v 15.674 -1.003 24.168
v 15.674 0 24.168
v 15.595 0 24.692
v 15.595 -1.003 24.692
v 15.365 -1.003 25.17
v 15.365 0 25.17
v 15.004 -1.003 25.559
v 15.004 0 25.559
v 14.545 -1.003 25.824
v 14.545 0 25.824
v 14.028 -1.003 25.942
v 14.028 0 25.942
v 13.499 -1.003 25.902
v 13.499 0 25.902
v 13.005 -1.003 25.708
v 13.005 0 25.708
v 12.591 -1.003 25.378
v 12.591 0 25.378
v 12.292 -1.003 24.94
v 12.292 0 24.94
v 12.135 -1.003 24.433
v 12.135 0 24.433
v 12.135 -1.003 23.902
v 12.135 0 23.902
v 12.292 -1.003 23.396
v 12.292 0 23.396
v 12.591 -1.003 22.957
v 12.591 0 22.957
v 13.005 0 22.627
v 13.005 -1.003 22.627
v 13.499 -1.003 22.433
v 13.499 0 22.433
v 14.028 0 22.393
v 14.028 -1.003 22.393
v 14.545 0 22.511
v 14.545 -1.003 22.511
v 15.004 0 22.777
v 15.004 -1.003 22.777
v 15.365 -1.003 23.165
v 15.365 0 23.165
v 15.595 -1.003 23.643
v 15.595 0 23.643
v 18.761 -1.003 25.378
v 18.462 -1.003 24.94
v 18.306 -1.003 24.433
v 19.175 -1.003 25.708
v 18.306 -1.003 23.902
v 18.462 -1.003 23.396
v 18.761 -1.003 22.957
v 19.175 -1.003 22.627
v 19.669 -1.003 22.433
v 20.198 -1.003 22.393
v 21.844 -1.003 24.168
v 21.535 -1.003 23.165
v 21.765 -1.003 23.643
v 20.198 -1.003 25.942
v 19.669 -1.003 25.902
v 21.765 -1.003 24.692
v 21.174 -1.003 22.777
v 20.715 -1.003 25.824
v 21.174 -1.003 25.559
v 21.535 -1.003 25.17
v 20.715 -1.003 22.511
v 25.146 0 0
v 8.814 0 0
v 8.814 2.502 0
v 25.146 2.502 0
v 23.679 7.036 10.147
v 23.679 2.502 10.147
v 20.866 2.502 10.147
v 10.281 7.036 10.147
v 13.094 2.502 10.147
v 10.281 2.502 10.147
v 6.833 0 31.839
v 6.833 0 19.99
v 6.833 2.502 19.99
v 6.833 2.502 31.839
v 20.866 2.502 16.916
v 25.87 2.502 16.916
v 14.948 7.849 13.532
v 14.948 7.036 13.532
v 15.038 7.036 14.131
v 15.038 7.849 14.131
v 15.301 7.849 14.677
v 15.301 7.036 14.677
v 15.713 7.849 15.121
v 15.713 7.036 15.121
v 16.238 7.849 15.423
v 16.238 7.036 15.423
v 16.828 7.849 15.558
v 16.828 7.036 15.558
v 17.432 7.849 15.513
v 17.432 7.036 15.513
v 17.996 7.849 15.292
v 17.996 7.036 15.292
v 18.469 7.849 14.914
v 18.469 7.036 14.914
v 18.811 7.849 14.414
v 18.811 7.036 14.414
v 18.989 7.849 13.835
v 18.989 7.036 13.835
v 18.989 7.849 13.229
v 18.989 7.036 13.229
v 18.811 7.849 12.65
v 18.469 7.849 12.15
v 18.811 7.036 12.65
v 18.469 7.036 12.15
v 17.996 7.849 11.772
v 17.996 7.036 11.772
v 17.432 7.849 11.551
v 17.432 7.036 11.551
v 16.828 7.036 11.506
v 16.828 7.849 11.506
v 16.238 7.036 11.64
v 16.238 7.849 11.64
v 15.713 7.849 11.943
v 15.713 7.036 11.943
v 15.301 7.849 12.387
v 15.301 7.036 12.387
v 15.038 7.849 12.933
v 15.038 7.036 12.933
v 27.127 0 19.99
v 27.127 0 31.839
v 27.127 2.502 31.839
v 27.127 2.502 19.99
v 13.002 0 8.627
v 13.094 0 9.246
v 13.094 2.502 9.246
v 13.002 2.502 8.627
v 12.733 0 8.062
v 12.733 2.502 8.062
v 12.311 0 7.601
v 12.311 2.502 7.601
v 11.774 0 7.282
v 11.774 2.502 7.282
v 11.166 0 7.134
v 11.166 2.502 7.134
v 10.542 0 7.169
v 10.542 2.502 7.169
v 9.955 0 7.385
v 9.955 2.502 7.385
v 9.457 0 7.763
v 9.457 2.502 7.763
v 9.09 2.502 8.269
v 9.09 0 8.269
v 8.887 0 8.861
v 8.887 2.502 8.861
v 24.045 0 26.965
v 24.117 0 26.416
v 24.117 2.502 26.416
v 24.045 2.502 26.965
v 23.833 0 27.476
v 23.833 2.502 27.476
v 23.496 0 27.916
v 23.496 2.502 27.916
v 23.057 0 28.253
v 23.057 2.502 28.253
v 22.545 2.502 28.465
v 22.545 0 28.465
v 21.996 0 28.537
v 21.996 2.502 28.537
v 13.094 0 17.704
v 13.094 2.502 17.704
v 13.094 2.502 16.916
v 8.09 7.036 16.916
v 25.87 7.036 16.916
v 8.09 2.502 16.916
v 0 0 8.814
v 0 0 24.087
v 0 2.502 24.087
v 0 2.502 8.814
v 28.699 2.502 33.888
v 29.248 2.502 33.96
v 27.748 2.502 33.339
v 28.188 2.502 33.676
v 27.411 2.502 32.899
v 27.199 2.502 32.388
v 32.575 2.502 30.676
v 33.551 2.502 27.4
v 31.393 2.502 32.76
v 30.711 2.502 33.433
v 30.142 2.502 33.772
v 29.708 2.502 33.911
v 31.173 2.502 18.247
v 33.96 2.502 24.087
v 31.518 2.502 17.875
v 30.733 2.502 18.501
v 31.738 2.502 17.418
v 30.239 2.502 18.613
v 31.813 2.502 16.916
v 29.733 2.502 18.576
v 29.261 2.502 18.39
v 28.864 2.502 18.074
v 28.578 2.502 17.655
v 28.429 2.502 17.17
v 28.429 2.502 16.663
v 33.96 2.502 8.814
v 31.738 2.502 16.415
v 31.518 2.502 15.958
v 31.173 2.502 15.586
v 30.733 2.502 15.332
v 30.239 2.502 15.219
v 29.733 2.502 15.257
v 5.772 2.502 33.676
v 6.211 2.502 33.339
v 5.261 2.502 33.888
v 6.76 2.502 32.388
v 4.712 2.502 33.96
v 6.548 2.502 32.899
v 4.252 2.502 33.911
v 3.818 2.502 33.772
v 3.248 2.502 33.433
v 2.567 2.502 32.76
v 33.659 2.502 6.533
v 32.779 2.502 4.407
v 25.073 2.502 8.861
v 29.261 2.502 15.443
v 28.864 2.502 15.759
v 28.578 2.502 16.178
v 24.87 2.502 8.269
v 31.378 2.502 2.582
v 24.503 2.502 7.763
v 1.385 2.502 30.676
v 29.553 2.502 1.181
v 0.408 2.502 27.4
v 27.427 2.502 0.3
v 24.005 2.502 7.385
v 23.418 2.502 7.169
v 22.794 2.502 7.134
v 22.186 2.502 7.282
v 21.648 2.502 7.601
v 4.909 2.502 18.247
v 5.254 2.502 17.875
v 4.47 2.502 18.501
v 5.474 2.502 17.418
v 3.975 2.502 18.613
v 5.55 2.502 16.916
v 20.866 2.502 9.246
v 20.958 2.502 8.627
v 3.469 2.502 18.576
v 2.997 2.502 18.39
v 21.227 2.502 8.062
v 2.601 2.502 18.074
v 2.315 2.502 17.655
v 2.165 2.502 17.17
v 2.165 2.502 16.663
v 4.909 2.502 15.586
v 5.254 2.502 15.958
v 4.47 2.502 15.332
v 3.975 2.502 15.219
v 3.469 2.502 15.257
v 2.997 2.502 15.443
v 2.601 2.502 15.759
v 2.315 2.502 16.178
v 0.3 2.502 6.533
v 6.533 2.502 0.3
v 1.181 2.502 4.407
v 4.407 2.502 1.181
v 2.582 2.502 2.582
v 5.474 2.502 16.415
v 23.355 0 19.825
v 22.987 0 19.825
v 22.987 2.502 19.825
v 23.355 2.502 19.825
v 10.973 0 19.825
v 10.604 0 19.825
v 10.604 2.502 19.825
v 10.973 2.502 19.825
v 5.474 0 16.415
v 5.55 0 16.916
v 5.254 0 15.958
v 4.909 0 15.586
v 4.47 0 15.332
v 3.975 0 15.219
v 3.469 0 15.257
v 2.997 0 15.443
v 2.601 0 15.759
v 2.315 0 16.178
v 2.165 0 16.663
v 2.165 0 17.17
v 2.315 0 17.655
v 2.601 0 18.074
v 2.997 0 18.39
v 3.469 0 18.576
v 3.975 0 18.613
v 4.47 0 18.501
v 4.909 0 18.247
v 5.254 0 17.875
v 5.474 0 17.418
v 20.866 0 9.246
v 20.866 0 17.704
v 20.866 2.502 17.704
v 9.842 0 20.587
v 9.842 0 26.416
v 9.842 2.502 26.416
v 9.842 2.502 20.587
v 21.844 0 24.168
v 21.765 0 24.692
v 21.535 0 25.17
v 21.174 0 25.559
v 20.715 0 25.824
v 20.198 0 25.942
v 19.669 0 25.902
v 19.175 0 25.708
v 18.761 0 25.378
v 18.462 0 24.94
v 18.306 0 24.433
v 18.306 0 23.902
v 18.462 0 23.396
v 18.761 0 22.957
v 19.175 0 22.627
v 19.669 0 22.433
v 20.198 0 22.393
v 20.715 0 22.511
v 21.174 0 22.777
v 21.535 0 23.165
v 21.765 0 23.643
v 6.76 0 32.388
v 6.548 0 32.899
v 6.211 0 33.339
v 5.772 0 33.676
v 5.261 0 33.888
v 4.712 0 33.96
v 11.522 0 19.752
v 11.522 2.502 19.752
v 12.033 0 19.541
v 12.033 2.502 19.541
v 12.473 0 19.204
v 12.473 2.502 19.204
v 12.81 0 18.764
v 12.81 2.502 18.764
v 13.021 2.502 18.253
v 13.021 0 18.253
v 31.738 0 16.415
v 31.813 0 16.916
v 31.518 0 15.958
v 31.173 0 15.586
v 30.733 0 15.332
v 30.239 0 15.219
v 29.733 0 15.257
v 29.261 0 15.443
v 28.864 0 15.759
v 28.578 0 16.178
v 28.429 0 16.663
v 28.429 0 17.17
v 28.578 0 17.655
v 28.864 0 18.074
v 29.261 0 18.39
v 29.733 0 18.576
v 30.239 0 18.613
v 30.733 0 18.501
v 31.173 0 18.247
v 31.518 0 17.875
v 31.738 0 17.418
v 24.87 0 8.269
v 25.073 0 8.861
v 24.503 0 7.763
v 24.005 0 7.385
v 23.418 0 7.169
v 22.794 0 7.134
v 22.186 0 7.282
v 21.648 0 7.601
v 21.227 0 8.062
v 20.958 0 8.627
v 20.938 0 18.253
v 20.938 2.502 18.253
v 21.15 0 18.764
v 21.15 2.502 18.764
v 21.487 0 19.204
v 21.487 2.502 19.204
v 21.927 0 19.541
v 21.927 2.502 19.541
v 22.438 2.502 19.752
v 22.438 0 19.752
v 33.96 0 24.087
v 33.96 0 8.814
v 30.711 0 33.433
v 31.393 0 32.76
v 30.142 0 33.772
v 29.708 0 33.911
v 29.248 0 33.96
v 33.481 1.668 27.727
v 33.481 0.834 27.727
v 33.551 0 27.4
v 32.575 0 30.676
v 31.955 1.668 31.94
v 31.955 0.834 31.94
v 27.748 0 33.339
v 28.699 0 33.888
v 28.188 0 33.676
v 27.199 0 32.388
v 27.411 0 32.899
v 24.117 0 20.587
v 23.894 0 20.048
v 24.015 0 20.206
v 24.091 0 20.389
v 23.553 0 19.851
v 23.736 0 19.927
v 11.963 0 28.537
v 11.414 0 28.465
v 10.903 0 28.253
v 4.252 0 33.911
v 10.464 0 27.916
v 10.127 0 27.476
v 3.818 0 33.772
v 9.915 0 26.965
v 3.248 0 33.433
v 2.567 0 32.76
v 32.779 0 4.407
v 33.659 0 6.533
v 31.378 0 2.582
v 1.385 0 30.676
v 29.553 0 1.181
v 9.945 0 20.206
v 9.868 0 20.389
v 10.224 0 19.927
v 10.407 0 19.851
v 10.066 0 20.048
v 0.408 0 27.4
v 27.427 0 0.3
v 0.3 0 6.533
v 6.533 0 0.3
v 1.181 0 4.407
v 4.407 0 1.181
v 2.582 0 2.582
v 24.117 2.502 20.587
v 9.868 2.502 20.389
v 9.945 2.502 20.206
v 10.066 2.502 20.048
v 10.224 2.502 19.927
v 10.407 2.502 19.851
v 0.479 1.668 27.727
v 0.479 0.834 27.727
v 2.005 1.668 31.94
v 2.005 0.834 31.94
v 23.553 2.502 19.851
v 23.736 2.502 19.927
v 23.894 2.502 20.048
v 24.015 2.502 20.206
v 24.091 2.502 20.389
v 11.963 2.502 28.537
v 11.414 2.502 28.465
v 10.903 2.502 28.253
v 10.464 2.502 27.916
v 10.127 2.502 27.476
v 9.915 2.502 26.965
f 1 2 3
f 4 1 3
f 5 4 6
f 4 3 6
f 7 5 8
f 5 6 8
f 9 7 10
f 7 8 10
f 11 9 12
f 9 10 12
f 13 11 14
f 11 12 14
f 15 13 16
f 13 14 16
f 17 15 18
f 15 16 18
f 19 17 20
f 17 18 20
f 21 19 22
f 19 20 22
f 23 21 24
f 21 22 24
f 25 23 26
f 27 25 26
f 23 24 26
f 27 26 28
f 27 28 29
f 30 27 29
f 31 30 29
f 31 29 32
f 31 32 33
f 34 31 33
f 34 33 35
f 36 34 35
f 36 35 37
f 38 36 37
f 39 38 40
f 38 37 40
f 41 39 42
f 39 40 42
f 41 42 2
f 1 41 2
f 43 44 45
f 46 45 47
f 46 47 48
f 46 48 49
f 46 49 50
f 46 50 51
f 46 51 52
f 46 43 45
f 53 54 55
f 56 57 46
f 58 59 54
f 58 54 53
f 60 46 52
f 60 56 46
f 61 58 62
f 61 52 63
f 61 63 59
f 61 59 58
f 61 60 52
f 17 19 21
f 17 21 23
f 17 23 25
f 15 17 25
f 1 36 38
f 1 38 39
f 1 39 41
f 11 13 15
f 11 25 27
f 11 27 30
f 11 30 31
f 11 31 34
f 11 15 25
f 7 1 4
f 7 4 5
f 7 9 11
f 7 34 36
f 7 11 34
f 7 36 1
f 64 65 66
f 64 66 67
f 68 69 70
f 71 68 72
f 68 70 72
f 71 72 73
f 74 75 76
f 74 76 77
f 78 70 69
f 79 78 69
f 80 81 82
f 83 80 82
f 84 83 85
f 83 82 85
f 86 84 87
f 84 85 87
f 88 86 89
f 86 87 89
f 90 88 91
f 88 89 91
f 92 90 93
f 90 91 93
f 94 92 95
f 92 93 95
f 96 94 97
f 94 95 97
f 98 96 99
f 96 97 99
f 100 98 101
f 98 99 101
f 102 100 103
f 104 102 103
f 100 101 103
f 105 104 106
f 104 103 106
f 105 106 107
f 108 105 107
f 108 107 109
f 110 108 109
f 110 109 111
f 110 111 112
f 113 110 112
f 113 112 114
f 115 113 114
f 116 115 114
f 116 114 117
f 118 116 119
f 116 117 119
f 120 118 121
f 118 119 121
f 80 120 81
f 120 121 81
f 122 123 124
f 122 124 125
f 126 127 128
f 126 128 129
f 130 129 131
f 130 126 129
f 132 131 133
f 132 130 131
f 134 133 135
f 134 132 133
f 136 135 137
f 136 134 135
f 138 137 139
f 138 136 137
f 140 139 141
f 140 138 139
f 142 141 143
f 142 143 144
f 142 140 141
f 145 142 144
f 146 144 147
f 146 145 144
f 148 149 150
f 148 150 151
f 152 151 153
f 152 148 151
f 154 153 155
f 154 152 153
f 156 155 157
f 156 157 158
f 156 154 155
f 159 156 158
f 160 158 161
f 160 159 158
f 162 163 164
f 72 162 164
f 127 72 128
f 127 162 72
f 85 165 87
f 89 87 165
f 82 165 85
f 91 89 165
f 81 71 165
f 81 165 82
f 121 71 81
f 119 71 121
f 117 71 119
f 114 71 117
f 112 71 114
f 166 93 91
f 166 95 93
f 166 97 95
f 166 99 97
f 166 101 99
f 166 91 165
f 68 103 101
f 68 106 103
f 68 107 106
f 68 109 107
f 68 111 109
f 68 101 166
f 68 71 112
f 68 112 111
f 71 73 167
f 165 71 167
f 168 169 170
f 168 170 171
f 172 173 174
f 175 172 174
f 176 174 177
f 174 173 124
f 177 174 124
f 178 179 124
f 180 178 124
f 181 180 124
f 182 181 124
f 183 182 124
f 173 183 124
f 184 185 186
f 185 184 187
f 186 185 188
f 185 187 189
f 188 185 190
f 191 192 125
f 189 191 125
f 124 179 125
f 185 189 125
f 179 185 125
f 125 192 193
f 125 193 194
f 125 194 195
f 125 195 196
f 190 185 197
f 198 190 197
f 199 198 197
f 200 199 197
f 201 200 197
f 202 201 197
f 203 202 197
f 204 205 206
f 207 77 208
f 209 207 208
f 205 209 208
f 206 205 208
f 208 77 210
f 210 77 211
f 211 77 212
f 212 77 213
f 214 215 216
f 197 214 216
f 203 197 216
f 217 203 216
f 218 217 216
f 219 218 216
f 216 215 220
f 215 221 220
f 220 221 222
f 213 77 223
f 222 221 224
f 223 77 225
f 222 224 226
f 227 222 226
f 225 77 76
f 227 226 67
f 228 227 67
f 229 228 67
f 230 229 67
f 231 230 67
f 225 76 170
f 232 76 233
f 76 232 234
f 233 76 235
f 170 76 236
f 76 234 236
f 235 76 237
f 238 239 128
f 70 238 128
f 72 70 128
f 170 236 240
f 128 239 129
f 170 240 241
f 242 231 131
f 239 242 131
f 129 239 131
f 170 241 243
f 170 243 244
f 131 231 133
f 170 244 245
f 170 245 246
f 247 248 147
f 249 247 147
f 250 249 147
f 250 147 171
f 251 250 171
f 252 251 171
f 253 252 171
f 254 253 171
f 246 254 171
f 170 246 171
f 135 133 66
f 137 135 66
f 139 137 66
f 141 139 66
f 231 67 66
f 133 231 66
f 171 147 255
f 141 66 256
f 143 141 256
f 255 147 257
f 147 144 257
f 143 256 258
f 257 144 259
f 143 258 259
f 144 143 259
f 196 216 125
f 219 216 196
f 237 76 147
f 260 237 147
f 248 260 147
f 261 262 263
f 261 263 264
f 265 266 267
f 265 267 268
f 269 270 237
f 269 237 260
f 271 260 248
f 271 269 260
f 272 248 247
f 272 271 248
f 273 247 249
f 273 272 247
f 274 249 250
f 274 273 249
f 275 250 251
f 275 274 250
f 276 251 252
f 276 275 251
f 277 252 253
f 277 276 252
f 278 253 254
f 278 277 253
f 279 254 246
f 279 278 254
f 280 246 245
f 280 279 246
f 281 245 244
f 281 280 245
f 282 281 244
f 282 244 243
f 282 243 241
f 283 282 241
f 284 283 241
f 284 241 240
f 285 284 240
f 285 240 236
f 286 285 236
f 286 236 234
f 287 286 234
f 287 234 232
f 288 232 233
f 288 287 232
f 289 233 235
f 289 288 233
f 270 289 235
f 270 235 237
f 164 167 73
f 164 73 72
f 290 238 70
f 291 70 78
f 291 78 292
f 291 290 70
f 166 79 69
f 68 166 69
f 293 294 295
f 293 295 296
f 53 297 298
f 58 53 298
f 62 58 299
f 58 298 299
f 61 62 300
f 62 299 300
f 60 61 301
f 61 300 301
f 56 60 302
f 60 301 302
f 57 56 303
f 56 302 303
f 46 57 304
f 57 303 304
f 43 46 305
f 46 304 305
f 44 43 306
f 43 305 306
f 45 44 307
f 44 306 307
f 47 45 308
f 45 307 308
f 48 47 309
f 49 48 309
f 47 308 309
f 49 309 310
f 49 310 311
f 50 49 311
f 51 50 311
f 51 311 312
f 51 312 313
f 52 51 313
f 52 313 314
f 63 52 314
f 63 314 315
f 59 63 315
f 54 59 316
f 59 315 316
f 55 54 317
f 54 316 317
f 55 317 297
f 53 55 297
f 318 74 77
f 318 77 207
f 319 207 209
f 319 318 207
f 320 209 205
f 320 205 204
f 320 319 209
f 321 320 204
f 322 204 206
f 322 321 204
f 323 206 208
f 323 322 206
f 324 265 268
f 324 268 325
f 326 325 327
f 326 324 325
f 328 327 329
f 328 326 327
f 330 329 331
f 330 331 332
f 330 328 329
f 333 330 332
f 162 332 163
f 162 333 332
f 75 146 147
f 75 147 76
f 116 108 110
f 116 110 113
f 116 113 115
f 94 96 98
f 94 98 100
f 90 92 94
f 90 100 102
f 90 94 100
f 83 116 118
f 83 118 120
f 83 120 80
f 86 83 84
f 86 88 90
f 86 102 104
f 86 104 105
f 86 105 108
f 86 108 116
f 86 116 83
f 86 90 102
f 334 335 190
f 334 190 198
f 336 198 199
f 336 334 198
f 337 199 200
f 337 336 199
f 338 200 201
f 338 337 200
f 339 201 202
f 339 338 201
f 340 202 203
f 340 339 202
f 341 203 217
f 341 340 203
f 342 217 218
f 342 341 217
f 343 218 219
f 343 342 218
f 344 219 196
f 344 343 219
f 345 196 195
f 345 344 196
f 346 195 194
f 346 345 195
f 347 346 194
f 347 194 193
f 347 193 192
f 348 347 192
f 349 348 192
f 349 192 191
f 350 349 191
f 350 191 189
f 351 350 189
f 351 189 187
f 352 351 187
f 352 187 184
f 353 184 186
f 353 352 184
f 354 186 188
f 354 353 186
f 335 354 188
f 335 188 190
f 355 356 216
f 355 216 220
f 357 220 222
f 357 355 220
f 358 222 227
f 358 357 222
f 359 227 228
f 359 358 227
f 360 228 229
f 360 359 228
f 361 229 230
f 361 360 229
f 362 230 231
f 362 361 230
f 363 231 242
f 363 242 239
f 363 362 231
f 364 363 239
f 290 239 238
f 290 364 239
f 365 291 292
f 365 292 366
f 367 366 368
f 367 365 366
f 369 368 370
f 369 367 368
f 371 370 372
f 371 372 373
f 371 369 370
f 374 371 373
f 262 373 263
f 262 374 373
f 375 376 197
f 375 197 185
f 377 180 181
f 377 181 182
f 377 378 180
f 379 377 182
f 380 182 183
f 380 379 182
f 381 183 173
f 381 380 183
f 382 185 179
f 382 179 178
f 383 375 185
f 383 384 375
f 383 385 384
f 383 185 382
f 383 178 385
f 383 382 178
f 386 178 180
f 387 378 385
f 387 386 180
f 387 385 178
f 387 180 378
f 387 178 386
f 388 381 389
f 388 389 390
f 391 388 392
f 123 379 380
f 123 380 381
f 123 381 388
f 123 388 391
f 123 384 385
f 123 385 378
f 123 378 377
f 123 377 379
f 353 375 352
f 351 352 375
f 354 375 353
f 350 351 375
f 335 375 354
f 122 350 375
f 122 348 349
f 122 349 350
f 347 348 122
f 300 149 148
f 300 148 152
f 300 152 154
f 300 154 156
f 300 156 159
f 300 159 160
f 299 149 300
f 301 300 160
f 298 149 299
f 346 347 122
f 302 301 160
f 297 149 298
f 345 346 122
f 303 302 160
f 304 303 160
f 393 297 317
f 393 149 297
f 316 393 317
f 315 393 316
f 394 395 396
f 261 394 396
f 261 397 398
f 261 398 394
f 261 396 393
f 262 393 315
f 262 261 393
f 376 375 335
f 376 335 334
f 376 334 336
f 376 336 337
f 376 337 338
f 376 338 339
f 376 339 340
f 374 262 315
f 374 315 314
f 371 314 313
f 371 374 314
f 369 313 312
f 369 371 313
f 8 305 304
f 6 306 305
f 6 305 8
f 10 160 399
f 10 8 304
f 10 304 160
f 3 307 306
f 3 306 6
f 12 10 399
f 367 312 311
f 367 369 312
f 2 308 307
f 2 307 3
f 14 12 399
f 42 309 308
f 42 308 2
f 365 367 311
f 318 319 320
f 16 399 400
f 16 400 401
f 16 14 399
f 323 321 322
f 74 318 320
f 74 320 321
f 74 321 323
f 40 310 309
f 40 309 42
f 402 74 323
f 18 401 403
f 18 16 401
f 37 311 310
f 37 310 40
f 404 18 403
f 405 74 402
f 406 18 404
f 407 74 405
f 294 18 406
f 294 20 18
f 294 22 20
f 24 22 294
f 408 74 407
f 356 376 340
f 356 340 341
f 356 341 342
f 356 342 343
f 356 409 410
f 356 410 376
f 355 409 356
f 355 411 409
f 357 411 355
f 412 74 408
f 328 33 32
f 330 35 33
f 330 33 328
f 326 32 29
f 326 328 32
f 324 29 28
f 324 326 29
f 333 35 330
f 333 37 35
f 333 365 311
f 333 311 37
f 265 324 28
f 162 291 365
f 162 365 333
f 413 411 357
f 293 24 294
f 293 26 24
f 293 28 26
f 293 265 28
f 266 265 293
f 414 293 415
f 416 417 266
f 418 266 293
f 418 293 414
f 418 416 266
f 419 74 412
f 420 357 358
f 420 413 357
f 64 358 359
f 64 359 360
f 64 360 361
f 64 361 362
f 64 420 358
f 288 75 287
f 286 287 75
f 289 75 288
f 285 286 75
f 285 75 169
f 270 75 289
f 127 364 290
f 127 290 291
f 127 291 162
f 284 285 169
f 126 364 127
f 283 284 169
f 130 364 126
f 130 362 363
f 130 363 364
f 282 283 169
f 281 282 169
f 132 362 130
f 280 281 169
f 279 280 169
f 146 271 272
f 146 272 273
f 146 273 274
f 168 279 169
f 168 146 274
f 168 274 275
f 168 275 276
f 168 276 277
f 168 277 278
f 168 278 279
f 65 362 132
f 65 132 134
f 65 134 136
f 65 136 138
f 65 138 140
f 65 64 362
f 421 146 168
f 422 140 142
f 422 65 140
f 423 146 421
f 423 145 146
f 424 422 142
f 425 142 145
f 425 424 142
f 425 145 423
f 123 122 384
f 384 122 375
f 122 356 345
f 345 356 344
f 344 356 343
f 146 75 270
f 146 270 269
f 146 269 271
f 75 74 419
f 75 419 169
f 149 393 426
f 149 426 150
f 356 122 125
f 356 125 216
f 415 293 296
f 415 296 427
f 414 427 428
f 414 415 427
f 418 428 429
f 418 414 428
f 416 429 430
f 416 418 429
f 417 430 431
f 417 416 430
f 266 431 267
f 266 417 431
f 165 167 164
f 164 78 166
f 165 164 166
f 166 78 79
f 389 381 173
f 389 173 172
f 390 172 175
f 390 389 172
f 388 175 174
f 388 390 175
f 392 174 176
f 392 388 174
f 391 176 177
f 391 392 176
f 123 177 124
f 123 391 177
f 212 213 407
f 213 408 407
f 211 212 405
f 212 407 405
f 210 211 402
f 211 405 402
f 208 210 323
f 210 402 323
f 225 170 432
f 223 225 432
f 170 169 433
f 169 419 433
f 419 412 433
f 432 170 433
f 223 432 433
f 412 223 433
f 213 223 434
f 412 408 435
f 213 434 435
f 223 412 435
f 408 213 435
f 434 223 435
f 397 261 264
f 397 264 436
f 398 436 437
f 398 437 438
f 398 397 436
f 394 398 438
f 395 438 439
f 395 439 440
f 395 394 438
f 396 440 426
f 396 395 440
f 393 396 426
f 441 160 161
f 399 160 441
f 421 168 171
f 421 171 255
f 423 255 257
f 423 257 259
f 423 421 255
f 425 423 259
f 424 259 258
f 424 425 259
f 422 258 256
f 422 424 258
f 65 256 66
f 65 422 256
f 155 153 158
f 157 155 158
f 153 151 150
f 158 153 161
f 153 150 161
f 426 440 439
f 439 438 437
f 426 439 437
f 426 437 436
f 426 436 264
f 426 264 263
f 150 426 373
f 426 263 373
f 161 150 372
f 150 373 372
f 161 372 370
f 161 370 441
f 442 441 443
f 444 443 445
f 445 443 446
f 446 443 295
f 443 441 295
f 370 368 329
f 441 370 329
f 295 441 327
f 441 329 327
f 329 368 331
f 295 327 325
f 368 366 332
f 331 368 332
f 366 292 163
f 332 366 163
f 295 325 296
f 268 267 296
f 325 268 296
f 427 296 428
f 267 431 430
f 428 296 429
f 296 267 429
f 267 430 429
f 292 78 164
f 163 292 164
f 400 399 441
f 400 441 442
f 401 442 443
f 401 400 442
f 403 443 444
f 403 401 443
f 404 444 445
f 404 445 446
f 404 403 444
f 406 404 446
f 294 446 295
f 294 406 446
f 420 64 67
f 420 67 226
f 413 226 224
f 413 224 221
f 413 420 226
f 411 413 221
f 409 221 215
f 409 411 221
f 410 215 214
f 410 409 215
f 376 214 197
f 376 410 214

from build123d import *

# Parameters (mm, degrees)
SKETCH1_R           = 1.7018
BOSS_EXTRUDE1_DEPTH = 2.5019
BOSS_EXTRUDE2_DEPTH = 4.5339
SKETCH3_R           = 2.032
BOSS_EXTRUDE3_DEPTH = 0.8128
SKETCH4_R           = 1.77918252
BOSS_EXTRUDE4_DEPTH = 1.0033


with BuildPart() as part:
    # Sketch1 → Boss-Extrude1 (new body)
    with BuildSketch(Plane(origin=(0, 0, 0), x_dir=(1, 0, 0), z_dir=(0, 1, 0))):
        with BuildLine():
            Line((27.1272, -31.8389), (27.1272, -19.9898))
            Line((27.1272, -19.9898), (25.072658108, -8.860571344))
            ThreePointArc((25.072658108, -8.860571344), (22.793680926, -7.133528849), (20.8661, -9.2456))
            Line((20.8661, -9.2456), (20.8661, -17.7038))
            ThreePointArc((20.8661, -17.7038), (21.487297228, -19.203502772), (22.987, -19.8247))
            Line((22.987, -19.8247), (23.3553, -19.8247))
            ThreePointArc((23.3553, -19.8247), (23.894115367, -20.047884633), (24.1173, -20.5867))
            Line((24.1173, -20.5867), (24.1173, -26.416))
            ThreePointArc((24.1173, -26.416), (23.496102772, -27.915702772), (21.9964, -28.5369))
            Line((21.9964, -28.5369), (11.9634, -28.5369))
            ThreePointArc((11.9634, -28.5369), (10.463697228, -27.915702772), (9.8425, -26.416))
            Line((9.8425, -26.416), (9.8425, -20.5867))
            ThreePointArc((9.8425, -20.5867), (10.065684633, -20.047884633), (10.6045, -19.8247))
            Line((10.6045, -19.8247), (10.9728, -19.8247))
            ThreePointArc((10.9728, -19.8247), (12.472502772, -19.203502772), (13.0937, -17.7038))
            Line((13.0937, -17.7038), (13.0937, -9.2456))
            ThreePointArc((13.0937, -9.2456), (11.166119074, -7.133528849), (8.887141892, -8.860571344))
            Line((8.887141892, -8.860571344), (6.8326, -19.9898))
            Line((6.8326, -19.9898), (6.8326, -31.8389))
            ThreePointArc((6.8326, -31.8389), (6.211402772, -33.338602772), (4.7117, -33.9598))
            add(Edge.make_bspline(
                [(0, -24.0873616), (0, -26.517133331), (1.36922065, -33.9598), (4.7117, -33.9598)],
                knots=[0, 0, 0, 0, 1, 1, 1, 1], degree=3))
            Line((0, -24.0873616), (0, -8.8138))
            ThreePointArc((0, -8.8138), (2.581502252, -2.581502252), (8.8138, 0))
            Line((8.8138, 0), (25.146, 0))
            ThreePointArc((25.146, 0), (31.378297748, -2.581502252), (33.9598, -8.8138))
            Line((33.9598, -8.8138), (33.9598, -24.0873616))
            add(Edge.make_bspline(
                [(33.9598, -24.0873616), (33.9598, -26.517133331), (32.59057935, -33.9598), (29.2481, -33.9598)],
                knots=[0, 0, 0, 0, 1, 1, 1, 1], degree=3))
            ThreePointArc((29.2481, -33.9598), (27.748397228, -33.338602772), (27.1272, -31.8389))
        make_face()
        with Locations((30.1117, -16.9164)):
            Circle(SKETCH1_R, mode=Mode.SUBTRACT)
        with Locations((3.8481, -16.9164)):
            Circle(SKETCH1_R, mode=Mode.SUBTRACT)
    extrude(amount=BOSS_EXTRUDE1_DEPTH)

    # Sketch2 → Boss-Extrude2 (add)
    with BuildSketch(Plane(origin=(0, 2.5019, 0), x_dir=(1, 0, 0), z_dir=(0, 1, 0))):
        Polygon((8.0899, -16.9164), (25.8699, -16.9164), (23.67915, -10.1473), (10.28065, -10.1473), align=None)
    extrude(amount=BOSS_EXTRUDE2_DEPTH)

    # Sketch3 → Boss-Extrude3 (add)
    with BuildSketch(Plane(origin=(0, 7.0358, 0), x_dir=(-1, 0, 0), z_dir=(0, 1, 0))):
        with Locations((-16.9799, 13.53185)):
            Circle(SKETCH3_R)
    extrude(amount=BOSS_EXTRUDE3_DEPTH)

    # Sketch4 → Boss-Extrude4 (add)
    with BuildSketch(Plane.XZ):
        with Locations((13.894791914, 24.167570002)):
            Circle(SKETCH4_R)
        with Locations((20.065008086, 24.167570002)):
            Circle(SKETCH4_R)
    extrude(amount=BOSS_EXTRUDE4_DEPTH)


solid = part.part
